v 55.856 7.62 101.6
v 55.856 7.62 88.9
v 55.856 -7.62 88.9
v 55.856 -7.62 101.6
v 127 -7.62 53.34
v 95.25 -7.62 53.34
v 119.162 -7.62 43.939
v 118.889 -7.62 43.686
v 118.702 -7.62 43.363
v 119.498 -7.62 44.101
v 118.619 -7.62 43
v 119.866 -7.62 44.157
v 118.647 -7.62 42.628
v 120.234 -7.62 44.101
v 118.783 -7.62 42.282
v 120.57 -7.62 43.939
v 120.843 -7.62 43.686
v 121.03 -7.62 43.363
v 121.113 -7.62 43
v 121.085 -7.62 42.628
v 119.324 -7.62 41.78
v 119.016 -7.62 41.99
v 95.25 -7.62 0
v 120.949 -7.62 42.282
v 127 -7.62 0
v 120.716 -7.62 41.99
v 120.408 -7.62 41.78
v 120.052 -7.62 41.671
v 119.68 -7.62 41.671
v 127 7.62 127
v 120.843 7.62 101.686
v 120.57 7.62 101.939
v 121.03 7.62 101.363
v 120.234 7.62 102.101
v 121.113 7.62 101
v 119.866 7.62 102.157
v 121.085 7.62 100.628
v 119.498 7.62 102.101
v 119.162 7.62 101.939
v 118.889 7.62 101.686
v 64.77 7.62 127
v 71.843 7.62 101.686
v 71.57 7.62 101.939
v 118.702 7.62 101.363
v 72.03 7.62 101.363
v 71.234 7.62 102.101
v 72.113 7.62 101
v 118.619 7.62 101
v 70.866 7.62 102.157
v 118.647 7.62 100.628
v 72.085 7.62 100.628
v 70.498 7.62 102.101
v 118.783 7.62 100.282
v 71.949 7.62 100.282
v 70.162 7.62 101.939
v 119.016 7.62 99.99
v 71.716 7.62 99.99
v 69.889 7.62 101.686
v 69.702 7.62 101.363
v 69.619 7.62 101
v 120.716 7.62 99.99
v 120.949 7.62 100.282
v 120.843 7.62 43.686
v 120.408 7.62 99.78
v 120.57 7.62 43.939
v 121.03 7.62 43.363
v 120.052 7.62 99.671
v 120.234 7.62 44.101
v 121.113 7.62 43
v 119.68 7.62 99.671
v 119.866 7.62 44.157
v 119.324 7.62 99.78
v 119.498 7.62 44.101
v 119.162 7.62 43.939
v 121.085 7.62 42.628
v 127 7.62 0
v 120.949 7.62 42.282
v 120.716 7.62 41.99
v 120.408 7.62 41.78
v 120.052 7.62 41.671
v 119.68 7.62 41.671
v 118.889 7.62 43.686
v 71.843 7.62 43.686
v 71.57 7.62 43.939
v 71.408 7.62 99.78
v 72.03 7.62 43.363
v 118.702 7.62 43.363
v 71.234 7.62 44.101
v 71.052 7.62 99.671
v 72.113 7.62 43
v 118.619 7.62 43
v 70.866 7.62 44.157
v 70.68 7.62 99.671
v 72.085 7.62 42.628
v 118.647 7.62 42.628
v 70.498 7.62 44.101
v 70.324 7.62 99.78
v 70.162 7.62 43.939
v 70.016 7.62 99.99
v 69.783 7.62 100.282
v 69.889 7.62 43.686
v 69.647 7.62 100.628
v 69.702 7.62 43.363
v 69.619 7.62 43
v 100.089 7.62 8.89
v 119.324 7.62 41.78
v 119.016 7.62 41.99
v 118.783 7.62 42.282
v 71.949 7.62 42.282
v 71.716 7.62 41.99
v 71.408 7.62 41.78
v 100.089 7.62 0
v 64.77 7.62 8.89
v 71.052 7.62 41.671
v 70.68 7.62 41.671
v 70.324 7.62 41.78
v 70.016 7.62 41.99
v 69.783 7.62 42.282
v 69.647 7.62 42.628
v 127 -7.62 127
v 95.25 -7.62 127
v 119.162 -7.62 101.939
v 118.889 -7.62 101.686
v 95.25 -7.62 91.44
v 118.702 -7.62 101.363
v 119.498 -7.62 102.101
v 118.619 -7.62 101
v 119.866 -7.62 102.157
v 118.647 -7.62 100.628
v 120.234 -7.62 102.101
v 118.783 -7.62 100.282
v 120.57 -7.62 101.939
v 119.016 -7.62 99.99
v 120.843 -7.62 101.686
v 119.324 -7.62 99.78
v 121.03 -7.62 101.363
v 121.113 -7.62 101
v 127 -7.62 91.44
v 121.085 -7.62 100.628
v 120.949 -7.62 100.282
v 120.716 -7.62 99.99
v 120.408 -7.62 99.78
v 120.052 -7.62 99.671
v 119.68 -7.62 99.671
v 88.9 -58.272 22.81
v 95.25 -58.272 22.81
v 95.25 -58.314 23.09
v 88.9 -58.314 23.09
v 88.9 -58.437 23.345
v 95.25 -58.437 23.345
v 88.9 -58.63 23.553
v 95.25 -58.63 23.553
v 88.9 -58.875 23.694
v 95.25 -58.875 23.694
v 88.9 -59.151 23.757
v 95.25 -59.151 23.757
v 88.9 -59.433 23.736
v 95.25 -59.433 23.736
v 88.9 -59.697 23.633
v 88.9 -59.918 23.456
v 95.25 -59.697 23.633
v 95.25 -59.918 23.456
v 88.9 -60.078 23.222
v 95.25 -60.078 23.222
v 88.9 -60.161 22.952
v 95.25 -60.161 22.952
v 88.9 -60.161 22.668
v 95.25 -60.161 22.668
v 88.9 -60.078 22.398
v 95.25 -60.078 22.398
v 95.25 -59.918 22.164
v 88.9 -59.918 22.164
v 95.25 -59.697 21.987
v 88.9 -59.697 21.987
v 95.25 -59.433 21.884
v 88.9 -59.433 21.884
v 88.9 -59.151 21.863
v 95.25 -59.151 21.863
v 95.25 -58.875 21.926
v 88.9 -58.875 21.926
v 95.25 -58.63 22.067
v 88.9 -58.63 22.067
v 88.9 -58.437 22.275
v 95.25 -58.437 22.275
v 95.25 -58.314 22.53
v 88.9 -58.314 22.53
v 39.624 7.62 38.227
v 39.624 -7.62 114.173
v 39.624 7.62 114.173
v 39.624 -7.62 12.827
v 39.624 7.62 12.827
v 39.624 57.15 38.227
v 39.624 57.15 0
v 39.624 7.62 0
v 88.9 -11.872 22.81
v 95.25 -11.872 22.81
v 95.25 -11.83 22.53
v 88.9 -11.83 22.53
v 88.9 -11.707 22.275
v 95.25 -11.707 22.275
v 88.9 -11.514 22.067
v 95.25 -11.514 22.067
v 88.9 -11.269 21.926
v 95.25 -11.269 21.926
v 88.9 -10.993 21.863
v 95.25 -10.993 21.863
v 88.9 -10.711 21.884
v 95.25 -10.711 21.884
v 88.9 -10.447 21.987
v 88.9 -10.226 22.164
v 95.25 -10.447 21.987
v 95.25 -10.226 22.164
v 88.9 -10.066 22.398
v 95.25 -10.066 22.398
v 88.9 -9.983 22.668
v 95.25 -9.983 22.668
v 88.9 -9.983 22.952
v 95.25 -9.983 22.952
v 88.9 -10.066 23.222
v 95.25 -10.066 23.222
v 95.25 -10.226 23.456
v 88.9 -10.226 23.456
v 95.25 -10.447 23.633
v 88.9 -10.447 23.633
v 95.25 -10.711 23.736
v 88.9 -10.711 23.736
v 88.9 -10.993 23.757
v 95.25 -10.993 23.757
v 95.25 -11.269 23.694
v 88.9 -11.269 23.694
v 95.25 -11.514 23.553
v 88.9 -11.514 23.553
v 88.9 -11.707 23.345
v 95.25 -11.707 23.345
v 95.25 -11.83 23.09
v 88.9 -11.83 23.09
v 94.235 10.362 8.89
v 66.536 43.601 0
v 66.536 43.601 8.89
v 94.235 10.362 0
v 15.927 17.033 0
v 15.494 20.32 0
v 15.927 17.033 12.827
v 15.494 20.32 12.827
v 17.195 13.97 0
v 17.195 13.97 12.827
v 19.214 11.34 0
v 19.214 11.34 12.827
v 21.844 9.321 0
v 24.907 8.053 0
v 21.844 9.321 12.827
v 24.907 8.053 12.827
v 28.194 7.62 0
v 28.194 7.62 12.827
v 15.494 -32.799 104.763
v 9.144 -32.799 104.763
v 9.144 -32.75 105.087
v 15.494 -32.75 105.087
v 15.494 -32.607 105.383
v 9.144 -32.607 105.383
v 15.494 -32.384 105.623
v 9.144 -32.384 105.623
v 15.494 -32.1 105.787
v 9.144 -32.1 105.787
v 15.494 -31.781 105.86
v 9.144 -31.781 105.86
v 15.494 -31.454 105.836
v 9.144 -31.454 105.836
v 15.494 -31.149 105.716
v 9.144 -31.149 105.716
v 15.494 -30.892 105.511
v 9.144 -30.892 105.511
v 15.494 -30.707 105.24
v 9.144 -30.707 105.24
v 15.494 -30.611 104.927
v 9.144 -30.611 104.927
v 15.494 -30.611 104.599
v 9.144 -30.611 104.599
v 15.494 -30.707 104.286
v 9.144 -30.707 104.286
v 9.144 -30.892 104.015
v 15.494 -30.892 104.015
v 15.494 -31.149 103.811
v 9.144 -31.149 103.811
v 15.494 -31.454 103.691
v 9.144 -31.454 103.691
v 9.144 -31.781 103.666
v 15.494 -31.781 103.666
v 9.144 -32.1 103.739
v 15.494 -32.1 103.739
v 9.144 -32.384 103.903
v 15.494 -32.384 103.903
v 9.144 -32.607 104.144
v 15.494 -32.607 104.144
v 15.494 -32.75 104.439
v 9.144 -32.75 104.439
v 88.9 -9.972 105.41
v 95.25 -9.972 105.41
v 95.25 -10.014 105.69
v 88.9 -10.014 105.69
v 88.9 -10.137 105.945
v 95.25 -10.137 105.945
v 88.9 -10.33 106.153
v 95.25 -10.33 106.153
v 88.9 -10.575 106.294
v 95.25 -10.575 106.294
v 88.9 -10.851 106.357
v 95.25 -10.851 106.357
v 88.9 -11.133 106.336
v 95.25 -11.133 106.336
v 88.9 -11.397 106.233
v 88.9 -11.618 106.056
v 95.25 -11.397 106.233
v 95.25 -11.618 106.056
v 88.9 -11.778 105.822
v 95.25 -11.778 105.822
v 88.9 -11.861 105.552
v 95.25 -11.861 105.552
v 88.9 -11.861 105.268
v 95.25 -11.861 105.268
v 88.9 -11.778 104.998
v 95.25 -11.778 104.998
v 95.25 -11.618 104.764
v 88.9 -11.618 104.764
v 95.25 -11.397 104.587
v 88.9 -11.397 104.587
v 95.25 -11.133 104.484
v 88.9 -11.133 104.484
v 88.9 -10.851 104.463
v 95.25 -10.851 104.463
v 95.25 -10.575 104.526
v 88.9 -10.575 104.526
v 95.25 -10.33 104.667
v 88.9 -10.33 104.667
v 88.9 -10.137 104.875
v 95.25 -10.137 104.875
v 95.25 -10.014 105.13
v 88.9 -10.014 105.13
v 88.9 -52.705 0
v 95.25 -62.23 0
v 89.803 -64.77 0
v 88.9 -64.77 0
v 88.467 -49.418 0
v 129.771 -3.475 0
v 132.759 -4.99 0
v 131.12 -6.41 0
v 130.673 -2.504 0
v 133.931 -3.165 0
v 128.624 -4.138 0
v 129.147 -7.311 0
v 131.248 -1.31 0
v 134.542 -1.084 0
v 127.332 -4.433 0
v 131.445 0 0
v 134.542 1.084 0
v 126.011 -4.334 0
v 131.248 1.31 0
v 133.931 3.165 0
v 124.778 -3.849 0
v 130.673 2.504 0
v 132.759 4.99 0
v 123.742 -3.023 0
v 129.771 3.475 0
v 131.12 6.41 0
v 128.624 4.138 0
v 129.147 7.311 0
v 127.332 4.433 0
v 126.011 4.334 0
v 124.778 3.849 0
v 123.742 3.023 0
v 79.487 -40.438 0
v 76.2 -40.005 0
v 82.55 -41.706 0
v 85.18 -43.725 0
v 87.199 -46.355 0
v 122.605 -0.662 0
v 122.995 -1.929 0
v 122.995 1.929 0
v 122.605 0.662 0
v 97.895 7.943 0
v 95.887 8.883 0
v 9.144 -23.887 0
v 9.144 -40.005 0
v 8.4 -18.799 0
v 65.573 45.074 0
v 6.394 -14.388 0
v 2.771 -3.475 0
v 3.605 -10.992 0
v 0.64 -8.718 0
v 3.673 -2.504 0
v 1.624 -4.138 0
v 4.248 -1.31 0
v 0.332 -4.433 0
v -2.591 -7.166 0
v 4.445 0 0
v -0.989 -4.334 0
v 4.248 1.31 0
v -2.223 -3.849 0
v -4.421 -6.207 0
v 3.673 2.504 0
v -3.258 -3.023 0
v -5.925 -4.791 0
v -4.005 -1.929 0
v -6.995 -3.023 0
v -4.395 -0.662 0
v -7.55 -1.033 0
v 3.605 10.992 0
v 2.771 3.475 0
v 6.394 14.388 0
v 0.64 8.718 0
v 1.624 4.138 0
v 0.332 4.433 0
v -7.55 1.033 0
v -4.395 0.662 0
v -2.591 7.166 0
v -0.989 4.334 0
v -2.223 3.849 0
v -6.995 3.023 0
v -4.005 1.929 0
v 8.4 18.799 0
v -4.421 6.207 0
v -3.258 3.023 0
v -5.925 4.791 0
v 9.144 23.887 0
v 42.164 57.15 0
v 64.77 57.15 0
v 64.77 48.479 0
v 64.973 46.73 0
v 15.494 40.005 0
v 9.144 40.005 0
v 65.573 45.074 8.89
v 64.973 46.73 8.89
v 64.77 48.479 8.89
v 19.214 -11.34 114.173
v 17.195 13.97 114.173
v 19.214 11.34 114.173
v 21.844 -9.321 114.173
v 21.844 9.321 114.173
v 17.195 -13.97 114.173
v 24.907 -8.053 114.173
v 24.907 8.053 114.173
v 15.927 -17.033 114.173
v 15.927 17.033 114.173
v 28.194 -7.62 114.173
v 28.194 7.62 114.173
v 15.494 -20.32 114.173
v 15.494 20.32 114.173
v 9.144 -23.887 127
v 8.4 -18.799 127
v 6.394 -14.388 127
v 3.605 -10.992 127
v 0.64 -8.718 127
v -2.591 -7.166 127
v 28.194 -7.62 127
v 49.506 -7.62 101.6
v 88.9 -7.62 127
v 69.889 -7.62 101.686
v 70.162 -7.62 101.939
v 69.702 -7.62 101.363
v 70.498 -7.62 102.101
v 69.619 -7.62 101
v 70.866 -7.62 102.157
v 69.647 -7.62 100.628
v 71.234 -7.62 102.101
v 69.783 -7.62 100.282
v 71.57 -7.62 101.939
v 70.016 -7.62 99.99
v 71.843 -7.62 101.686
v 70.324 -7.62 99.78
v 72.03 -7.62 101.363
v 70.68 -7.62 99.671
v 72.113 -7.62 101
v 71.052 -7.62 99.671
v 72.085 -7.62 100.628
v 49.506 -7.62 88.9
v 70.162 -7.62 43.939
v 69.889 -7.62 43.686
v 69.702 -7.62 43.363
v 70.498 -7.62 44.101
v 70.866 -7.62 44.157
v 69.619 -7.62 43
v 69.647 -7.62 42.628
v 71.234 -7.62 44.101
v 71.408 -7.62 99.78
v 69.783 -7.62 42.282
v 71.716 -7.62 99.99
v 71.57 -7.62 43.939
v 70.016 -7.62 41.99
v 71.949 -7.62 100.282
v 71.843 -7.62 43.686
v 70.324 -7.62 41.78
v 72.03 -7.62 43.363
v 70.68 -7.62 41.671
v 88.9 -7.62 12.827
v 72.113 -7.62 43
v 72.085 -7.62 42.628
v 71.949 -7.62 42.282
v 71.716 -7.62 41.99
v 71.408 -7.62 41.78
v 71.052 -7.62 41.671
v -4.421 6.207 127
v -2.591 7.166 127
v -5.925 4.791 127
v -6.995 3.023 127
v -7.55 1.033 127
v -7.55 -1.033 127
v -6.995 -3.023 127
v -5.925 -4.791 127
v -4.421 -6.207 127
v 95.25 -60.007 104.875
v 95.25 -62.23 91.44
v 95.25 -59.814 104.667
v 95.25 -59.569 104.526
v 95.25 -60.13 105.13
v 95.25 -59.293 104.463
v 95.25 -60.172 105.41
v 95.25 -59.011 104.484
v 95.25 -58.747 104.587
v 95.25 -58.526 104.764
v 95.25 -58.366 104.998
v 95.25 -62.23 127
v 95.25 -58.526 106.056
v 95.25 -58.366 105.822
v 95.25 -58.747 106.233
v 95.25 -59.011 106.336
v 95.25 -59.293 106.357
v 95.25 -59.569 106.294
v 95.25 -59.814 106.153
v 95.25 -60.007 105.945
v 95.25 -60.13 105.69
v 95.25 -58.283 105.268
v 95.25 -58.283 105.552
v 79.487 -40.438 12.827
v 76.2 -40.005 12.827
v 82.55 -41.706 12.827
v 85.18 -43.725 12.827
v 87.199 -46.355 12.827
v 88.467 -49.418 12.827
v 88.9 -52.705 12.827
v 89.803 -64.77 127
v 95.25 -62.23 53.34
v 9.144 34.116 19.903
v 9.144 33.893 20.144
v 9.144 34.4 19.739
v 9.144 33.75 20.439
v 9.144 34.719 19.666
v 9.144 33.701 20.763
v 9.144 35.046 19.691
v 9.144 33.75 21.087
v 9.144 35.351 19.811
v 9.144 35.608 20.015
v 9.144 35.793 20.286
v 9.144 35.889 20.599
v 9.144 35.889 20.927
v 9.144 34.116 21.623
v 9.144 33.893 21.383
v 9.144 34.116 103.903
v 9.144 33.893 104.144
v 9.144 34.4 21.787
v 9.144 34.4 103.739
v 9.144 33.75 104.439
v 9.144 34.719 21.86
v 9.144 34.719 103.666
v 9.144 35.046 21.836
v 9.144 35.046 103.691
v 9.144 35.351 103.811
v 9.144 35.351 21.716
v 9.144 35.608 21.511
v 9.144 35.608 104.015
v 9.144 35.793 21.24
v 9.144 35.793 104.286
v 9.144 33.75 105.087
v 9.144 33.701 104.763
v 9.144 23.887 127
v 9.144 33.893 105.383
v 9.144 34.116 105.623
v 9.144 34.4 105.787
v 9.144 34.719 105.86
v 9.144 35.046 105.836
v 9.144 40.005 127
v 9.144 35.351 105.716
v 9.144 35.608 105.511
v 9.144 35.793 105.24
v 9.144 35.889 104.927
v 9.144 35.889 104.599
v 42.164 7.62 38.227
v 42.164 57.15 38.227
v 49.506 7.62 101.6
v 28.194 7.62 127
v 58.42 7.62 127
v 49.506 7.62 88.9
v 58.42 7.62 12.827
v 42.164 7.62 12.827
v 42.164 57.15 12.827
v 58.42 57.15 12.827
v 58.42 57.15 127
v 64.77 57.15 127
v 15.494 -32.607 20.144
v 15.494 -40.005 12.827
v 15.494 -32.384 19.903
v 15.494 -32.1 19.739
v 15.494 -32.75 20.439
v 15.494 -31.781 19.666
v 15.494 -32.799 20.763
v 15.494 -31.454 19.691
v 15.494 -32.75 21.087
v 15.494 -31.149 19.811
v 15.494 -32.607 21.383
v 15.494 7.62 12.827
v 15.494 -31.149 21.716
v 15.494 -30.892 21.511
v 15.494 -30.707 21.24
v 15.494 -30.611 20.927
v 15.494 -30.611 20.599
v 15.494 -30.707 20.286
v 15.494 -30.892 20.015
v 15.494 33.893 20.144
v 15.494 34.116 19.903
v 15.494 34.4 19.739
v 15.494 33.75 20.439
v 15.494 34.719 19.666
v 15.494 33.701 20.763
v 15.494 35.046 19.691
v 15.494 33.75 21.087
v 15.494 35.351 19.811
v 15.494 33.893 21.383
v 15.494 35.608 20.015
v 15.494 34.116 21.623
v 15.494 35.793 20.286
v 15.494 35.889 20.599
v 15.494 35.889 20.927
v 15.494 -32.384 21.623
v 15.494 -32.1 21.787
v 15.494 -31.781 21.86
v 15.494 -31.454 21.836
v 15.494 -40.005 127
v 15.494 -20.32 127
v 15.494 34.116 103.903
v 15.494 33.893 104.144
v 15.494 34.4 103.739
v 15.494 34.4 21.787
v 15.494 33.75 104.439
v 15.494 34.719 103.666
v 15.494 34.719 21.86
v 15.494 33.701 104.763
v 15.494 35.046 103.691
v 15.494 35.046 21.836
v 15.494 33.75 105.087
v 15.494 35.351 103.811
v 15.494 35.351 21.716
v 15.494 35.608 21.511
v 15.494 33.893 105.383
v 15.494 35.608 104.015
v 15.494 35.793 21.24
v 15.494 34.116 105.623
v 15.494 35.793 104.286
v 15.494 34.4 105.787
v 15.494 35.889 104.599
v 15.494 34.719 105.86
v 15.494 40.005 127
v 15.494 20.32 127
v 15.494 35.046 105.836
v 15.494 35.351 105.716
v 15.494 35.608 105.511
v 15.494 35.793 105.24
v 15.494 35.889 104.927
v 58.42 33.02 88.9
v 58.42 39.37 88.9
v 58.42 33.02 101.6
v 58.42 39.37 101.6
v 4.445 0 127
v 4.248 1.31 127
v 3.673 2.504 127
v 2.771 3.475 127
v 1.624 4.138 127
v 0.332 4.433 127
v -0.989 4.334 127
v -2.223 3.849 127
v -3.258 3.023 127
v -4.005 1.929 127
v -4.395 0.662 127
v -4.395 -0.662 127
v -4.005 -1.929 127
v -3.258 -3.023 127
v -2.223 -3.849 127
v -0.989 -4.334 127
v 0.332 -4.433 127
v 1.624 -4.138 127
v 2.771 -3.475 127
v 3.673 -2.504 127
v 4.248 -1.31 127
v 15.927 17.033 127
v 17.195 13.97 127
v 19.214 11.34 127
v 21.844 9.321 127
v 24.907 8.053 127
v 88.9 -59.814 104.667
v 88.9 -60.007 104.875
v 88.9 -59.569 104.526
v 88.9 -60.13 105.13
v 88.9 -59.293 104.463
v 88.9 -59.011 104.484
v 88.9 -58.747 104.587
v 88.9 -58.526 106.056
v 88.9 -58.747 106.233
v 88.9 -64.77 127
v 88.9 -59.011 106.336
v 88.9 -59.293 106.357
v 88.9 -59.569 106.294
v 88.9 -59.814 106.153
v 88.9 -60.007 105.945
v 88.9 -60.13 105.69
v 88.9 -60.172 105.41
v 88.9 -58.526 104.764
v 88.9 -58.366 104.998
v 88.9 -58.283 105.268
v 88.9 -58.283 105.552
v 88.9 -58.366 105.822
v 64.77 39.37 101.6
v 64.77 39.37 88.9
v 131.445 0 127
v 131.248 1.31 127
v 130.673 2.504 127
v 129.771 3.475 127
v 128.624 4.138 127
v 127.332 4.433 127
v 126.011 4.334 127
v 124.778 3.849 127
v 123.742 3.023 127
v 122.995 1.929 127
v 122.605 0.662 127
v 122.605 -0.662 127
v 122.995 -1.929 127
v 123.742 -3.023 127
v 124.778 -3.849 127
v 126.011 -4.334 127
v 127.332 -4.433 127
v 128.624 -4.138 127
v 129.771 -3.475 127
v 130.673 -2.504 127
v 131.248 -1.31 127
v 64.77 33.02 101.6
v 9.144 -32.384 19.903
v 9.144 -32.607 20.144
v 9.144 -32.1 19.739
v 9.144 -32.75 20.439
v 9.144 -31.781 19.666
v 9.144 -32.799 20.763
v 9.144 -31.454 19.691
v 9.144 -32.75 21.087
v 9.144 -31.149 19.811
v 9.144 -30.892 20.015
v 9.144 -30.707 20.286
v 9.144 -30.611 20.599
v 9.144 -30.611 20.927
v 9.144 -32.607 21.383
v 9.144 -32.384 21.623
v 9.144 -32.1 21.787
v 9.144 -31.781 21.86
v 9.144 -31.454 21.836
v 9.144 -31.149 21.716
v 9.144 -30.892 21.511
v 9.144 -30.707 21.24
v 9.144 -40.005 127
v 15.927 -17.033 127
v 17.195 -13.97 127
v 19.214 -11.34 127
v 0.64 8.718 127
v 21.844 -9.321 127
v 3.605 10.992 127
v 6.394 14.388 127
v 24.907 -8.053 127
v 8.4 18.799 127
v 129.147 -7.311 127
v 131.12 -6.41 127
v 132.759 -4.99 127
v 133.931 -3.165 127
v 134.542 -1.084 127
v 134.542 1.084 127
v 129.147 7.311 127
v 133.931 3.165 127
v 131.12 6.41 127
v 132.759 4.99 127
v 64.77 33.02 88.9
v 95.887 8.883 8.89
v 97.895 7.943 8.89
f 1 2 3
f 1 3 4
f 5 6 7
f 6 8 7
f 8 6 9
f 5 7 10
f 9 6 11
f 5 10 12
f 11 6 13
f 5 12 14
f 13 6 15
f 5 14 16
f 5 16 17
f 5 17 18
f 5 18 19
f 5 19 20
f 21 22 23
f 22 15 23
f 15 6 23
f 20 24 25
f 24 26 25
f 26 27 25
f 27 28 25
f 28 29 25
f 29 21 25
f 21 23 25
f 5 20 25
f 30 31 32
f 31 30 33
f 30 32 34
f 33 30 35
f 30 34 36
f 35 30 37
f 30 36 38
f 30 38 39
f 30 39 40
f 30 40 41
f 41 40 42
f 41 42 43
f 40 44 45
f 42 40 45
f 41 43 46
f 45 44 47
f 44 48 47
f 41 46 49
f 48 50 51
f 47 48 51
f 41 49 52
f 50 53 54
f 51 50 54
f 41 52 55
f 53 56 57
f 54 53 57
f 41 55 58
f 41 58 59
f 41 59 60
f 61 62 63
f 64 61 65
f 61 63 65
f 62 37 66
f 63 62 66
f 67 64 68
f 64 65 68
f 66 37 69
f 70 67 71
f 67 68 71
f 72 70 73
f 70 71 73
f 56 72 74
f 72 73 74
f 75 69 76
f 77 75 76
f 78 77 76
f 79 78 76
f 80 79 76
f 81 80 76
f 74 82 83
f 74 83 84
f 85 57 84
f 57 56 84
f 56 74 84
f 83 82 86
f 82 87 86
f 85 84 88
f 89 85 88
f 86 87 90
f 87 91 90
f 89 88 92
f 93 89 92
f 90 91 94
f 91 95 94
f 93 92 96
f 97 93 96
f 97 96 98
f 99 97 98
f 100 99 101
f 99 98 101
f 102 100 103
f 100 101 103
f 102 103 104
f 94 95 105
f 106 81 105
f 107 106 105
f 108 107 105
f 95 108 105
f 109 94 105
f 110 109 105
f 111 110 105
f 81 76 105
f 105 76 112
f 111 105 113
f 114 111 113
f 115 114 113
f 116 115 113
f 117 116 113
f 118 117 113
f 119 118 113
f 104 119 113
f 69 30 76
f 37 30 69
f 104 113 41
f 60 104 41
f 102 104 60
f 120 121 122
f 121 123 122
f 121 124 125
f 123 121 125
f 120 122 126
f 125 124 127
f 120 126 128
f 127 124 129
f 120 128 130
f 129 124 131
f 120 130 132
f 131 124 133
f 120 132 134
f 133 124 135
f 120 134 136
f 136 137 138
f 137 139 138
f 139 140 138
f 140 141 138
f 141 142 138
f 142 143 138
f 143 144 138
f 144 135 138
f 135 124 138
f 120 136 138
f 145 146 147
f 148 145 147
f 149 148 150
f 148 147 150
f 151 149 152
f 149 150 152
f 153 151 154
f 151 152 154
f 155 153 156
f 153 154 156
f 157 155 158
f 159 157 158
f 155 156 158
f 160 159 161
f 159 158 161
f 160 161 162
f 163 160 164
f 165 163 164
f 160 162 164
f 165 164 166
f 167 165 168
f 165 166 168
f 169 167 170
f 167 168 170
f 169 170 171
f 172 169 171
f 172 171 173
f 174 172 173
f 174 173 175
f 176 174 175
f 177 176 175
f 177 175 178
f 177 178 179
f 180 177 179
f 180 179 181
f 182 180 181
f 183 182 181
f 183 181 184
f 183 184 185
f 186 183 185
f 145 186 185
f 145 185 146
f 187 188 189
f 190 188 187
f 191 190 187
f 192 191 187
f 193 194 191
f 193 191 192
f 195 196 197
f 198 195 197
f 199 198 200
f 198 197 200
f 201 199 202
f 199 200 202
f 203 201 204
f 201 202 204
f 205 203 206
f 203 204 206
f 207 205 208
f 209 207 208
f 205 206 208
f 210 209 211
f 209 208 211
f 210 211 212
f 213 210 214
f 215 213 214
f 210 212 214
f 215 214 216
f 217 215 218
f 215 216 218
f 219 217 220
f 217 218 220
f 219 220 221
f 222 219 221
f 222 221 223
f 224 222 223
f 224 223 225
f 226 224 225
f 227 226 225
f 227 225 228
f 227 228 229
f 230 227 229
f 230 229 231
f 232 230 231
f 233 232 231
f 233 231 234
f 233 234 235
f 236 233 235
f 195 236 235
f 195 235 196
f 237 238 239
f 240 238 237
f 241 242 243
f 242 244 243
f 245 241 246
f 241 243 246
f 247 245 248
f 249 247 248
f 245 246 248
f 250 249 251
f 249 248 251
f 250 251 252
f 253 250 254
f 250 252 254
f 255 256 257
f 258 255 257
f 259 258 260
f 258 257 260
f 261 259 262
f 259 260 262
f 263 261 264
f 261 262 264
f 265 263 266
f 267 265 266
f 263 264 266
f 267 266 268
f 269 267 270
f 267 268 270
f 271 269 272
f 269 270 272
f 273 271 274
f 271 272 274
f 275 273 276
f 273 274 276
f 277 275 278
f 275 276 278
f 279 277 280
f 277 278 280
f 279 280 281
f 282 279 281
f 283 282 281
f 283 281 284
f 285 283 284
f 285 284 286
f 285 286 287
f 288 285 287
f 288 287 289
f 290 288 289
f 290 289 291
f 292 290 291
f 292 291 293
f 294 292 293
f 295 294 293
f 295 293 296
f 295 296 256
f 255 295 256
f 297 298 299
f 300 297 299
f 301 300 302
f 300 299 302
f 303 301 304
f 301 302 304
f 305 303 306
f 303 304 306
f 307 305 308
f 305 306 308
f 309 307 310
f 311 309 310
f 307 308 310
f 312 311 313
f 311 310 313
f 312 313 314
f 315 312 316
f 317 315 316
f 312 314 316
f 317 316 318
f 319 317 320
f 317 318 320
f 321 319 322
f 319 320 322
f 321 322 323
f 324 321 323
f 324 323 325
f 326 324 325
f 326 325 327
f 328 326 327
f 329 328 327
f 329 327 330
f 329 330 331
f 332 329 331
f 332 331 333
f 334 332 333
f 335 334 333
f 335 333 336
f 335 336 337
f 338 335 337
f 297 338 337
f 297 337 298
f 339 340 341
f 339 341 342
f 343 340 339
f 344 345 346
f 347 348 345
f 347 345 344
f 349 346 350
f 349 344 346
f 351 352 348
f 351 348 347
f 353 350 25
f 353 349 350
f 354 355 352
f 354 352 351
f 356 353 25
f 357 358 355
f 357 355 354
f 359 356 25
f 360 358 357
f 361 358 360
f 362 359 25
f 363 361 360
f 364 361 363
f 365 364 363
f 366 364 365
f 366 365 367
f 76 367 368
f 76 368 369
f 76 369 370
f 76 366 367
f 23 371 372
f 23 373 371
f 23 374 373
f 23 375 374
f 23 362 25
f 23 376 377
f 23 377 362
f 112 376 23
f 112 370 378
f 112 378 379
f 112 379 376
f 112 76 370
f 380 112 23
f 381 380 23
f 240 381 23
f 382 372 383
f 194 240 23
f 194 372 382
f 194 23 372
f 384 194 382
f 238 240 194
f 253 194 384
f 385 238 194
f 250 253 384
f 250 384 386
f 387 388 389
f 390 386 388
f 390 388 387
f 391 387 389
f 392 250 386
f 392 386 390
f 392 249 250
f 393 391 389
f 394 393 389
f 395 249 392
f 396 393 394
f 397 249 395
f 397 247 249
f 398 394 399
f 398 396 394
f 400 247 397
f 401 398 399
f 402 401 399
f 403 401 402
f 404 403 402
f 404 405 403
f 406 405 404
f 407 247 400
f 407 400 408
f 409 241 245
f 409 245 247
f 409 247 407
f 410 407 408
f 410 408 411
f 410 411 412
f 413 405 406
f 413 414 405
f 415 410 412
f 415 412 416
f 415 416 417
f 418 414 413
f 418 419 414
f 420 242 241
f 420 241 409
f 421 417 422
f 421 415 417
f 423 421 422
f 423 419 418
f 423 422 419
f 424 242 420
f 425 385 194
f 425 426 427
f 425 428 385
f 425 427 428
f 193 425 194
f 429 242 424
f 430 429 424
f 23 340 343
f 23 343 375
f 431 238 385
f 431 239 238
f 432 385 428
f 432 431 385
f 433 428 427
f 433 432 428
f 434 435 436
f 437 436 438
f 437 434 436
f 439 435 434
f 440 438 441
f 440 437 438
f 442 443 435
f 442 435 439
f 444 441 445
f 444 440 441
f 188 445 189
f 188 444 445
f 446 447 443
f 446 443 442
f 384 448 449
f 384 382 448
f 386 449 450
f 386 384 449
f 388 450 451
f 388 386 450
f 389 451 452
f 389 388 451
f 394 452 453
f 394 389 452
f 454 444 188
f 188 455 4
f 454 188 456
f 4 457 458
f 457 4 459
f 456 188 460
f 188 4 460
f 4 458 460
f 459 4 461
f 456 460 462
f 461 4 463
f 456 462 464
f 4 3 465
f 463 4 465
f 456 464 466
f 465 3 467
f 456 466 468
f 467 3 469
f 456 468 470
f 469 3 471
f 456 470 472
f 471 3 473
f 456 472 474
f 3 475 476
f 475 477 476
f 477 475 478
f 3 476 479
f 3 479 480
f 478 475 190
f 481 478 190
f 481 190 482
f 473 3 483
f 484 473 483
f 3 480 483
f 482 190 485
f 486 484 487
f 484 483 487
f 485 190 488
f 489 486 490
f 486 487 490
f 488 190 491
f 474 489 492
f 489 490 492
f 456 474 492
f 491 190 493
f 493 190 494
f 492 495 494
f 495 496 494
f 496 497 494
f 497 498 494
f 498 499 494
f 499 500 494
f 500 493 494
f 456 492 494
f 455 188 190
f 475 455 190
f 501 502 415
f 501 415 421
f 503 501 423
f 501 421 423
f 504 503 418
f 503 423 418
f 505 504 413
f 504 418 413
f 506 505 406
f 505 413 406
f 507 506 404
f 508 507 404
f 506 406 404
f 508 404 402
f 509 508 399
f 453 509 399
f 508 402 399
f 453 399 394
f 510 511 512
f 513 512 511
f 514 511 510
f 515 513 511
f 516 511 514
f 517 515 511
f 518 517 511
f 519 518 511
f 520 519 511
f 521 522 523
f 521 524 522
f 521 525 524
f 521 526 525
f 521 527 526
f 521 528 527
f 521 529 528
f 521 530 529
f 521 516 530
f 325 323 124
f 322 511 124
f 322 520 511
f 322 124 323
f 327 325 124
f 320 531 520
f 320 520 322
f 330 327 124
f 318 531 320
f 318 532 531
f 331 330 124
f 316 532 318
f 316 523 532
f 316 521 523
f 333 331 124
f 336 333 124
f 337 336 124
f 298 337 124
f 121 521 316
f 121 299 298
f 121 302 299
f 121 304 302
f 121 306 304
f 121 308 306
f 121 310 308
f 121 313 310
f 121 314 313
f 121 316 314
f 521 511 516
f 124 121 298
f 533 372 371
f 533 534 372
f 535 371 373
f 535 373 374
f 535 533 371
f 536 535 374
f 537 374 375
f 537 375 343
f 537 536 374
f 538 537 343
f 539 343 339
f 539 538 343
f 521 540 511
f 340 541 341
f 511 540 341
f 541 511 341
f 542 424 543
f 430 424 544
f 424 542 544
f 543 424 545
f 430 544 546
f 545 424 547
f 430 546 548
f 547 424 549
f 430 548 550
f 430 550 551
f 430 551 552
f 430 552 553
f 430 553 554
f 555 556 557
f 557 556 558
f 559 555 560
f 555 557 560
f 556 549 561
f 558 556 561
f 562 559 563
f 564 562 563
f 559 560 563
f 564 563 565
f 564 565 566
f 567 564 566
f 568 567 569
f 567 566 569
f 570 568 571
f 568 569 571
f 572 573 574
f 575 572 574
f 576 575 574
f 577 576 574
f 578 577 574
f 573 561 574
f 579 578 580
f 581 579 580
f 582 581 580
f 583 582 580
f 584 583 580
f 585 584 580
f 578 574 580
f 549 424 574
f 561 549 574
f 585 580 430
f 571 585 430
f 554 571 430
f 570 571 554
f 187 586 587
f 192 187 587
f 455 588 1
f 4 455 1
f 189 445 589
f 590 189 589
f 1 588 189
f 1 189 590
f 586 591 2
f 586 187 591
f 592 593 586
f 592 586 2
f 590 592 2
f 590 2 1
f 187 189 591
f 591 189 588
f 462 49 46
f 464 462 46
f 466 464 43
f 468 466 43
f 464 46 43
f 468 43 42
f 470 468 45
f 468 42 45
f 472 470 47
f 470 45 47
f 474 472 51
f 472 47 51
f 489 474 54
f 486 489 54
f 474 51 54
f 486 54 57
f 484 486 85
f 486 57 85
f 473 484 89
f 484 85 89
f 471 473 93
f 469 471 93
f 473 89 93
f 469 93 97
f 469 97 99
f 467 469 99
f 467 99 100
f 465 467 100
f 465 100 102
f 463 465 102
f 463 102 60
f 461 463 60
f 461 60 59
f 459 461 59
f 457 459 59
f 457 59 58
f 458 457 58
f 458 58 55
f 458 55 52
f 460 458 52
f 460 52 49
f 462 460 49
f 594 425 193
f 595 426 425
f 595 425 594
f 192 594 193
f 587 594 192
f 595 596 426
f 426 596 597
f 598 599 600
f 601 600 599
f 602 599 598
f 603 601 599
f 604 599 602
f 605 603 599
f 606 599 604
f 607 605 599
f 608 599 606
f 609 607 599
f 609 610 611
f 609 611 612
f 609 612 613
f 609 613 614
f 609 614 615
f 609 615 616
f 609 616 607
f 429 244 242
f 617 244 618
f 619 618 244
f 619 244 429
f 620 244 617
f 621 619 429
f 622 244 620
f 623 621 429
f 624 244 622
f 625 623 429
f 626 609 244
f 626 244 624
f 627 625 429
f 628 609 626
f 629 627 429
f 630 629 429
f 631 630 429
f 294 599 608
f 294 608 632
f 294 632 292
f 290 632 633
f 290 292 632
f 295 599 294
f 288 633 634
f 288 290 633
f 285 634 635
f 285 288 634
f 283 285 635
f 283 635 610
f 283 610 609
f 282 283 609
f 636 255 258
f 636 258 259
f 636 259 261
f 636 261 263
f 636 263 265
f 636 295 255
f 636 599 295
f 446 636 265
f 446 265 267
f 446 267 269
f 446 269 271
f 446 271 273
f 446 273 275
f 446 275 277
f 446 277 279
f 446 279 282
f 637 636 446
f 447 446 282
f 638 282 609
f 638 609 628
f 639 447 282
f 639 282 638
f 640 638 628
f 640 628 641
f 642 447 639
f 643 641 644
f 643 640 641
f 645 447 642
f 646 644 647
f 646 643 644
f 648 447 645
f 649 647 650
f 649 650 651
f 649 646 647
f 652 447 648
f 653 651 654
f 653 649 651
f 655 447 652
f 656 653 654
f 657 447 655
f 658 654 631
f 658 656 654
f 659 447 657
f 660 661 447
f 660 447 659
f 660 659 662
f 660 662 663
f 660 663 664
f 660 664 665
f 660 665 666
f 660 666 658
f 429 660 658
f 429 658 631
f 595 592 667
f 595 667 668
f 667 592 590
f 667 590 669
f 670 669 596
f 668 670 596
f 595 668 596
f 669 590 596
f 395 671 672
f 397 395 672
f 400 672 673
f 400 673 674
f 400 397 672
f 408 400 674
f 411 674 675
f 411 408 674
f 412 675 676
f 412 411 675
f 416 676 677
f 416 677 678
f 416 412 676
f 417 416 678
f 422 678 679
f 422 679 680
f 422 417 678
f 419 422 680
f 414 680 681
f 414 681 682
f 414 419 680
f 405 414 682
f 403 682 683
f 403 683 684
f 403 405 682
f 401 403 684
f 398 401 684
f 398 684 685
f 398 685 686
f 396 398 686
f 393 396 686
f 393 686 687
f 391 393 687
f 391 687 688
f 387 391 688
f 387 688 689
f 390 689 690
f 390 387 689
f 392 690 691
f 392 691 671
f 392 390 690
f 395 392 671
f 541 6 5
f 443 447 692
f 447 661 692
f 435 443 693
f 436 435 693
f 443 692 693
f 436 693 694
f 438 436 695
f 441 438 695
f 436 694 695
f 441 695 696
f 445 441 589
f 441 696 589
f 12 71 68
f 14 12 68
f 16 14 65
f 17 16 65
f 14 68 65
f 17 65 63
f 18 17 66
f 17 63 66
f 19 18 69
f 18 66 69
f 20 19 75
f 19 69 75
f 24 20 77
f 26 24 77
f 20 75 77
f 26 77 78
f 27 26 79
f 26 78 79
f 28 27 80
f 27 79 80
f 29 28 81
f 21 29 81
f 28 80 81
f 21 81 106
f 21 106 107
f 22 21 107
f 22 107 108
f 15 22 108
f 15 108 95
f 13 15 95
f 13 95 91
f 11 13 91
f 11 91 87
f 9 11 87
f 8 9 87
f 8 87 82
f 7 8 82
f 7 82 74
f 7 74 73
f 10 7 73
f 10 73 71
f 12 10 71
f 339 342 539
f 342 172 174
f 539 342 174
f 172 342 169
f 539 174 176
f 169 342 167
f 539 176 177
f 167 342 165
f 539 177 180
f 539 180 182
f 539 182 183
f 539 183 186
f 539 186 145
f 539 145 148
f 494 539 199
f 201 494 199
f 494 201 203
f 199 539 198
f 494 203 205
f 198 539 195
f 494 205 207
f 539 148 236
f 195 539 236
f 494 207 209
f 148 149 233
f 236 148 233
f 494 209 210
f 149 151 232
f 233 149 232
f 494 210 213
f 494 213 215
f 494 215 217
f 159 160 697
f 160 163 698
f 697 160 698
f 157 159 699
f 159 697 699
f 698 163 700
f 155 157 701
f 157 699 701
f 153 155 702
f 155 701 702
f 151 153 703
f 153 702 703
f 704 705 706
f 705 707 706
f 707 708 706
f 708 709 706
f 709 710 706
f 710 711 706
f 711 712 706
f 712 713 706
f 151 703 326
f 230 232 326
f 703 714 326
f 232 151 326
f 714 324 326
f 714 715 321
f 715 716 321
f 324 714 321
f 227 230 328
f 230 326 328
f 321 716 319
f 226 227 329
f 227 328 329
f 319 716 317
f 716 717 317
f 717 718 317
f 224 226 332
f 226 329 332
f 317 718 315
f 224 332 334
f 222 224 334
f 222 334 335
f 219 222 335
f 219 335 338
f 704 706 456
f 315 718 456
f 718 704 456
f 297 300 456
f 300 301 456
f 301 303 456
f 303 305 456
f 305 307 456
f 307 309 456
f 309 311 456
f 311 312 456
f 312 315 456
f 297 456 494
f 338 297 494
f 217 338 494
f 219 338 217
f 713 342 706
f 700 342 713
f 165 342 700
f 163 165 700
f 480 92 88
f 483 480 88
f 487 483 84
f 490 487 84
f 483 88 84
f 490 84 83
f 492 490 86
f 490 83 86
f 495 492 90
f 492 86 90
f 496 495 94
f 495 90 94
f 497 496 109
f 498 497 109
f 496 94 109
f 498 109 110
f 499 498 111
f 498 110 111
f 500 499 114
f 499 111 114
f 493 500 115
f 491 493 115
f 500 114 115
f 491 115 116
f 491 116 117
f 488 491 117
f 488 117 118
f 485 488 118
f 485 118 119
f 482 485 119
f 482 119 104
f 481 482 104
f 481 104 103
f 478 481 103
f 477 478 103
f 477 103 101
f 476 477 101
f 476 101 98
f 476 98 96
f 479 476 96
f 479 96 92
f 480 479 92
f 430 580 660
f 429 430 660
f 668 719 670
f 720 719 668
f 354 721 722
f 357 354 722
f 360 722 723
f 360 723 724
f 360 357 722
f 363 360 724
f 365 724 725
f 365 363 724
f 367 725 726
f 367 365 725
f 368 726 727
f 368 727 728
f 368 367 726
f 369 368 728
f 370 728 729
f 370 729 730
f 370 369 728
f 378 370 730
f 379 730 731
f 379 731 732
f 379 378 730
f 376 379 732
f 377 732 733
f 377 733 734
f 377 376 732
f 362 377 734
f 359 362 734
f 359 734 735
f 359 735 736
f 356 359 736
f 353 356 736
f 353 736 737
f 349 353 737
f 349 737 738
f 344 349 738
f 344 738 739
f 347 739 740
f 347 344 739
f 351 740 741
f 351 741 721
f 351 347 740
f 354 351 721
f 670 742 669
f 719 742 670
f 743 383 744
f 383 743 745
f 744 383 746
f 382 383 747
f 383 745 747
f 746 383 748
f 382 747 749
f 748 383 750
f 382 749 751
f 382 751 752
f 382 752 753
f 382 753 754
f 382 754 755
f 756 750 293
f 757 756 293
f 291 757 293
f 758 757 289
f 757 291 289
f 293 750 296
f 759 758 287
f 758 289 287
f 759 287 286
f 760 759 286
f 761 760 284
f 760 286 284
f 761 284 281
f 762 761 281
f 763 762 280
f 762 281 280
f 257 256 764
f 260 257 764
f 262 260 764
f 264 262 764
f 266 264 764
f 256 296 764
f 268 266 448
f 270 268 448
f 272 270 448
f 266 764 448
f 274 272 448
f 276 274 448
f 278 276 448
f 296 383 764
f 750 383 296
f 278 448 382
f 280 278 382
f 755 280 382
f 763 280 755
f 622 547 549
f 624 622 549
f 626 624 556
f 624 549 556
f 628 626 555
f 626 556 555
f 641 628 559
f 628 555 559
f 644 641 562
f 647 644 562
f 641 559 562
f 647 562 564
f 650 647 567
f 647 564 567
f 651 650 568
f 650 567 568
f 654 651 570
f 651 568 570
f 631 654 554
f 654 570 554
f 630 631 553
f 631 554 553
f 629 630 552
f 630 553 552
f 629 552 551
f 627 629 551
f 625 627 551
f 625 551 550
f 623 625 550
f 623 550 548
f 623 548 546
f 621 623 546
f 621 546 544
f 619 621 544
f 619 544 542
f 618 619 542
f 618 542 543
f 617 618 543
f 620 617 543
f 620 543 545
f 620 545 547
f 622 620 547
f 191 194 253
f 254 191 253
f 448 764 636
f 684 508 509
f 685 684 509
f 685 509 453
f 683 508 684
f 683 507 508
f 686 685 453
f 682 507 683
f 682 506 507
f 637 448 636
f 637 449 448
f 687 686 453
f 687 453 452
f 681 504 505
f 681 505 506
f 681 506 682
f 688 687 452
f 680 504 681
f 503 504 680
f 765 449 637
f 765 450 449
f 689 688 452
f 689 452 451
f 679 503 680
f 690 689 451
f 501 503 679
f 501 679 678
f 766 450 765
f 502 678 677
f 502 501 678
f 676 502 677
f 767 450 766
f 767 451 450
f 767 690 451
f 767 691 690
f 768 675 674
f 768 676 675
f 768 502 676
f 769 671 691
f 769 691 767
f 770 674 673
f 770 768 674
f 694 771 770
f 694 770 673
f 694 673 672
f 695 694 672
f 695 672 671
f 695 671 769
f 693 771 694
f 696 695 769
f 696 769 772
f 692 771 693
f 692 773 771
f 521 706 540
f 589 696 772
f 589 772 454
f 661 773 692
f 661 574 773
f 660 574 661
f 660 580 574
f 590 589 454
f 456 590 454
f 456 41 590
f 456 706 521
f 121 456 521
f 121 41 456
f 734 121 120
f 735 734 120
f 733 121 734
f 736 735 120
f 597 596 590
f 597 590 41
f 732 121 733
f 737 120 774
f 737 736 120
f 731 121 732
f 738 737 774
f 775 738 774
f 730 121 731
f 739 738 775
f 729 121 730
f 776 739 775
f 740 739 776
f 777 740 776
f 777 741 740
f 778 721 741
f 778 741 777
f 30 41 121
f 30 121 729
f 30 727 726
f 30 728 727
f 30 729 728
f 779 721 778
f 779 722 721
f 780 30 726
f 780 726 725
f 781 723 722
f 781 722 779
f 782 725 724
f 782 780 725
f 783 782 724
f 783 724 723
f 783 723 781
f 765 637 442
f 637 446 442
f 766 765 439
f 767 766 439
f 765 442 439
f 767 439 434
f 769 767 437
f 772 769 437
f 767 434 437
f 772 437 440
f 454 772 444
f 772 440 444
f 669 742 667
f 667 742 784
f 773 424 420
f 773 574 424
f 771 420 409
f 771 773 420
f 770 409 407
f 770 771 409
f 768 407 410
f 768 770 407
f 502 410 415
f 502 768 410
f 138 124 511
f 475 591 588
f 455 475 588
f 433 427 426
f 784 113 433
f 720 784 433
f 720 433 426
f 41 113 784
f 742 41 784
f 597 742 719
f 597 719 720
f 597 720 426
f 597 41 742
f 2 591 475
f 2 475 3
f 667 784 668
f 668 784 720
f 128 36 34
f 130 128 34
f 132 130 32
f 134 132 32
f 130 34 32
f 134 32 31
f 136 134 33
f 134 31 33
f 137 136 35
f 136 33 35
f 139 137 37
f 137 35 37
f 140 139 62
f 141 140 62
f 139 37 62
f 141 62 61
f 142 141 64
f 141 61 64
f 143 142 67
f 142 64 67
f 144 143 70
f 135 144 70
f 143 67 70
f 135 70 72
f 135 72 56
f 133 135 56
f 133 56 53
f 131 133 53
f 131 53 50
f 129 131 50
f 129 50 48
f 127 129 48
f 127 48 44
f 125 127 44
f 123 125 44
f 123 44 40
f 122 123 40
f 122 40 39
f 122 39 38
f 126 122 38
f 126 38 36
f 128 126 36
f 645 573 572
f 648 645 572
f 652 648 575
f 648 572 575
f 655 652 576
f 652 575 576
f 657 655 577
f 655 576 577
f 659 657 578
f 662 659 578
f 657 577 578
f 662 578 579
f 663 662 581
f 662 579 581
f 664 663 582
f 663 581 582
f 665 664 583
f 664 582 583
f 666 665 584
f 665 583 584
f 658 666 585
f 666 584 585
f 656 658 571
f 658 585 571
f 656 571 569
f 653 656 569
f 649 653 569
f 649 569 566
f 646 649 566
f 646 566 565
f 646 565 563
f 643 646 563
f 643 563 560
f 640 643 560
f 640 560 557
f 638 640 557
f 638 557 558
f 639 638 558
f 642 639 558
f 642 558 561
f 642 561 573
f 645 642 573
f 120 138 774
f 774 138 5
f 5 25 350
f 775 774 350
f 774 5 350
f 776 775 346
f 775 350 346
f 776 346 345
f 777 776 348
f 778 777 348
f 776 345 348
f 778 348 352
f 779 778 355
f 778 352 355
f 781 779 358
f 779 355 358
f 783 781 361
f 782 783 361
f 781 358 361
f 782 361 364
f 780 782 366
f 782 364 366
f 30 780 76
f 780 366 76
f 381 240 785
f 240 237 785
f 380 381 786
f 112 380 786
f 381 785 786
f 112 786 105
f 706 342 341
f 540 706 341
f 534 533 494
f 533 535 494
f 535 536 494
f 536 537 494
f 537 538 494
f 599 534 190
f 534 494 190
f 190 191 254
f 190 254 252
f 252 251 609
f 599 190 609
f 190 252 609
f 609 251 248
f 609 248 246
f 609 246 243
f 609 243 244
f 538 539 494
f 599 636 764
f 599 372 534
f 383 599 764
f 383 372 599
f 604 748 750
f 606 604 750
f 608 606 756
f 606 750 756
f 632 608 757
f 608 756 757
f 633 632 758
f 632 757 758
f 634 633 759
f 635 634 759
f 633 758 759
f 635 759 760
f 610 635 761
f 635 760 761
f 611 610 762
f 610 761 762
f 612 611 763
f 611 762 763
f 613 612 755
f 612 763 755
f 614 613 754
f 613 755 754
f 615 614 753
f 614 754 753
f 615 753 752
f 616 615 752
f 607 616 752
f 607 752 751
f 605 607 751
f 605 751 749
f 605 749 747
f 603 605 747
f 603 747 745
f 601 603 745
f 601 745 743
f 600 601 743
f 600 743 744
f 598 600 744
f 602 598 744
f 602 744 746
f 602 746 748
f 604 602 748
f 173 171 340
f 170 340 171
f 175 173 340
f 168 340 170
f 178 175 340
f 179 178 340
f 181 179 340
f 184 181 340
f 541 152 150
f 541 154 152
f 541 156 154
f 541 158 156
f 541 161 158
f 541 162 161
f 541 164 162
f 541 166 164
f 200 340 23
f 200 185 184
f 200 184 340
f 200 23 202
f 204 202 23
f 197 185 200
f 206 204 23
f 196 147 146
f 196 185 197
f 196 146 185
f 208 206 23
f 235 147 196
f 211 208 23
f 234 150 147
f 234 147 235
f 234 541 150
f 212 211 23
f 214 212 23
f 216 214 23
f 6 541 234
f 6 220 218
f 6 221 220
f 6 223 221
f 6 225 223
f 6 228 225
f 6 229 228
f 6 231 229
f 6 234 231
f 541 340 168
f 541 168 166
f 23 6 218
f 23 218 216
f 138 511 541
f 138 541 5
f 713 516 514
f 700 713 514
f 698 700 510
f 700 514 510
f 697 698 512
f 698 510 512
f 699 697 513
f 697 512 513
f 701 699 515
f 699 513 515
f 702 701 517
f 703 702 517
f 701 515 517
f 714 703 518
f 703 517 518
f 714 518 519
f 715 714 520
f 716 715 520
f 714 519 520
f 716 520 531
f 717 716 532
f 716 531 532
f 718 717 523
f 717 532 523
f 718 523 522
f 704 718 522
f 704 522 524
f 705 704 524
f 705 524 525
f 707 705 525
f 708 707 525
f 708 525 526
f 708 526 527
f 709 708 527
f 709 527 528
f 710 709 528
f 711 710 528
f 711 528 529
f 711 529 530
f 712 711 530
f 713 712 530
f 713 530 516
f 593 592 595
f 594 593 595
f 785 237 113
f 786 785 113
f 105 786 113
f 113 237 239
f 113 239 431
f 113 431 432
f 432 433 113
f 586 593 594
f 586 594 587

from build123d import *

# Parameters (mm, degrees)
SKETCH1_R            = 4.445
BOSS_EXTRUDE1_DEPTH  = 127
SKETCH7_W            = 6.35
SKETCH7_H            = 57.15
SKETCH7_H_2          = 80.01
SKETCH7_H_3          = 66.04
BOSS_EXTRUDE4_DEPTH  = 127
CUT_EXTRUDE2_REACH   = 191.917
SKETCH8_R            = 1.0999978
CUT_EXTRUDE4_REACH   = 200.726
SKETCH11_W           = 42.926
SKETCH11_H           = 101.345290086
FILLET1_R            = 17.78
CUT_EXTRUDE6_REACH   = 200.726
SKETCH14_R           = 1.249999967
SKETCH15_W           = 6.35
SKETCH15_H           = 127
CUT_EXTRUDE7_DEPTH   = 7.62
SKETCH16_W           = 12.827354957
SKETCH16_H           = 49.53
BOSS_EXTRUDE5_DEPTH  = 16.256
SKETCH17_W           = 38.227354957
SKETCH17_H           = 49.53
BOSS_EXTRUDE6_DEPTH  = 2.54
SKETCH18_W           = 21.632068301
SKETCH18_H           = 15.24
BOSS_EXTRUDE7_DEPTH  = 101.345290086
FILLET2_R            = 12.7
SKETCH23_R           = 0.95
CUT_EXTRUDE8_DEPTH   = 25.4
CHAMFER1_SIZE        = 2.54
CHAMFER1_SIZE2       = 5.447047578
BOSS_EXTRUDE10_DEPTH = 38.1
SKETCH26_W           = 73.406
SKETCH26_H           = 32.385
BOSS_EXTRUDE11_DEPTH = 12.827354957
FILLET3_R            = 12.7
BOSS_EXTRUDE12_DEPTH = 8.89
FILLET4_R            = 7.62
SKETCH28_W           = 6.35
SKETCH28_H           = 12.7
CUT_EXTRUDE9_DEPTH   = 25.4
SKETCH29_W           = 12.7
SKETCH29_H           = 6.35
CUT_EXTRUDE10_DEPTH  = 25.4


with BuildPart() as part:
    # Sketch1 → Boss-Extrude1 (new body)
    with BuildSketch(Plane.XY):
        with BuildLine():
            Line((0, -7.62), (127, -7.62))
            ThreePointArc((127, -7.62), (134.62, 0), (127, 7.62))
            Line((127, 7.62), (0, 7.62))
            ThreePointArc((0, 7.62), (-7.62, 0), (0, -7.62))
        make_face()
        with Locations((127, 0)):
            Circle(SKETCH1_R, mode=Mode.SUBTRACT)
        Circle(SKETCH1_R, mode=Mode.SUBTRACT)
    extrude(amount=BOSS_EXTRUDE1_DEPTH)

    # Sketch7 → Boss-Extrude4 (add)
    with BuildSketch(Plane.XY.offset(127)):
        with Locations((92.075, -36.195)):
            Rectangle(SKETCH7_W, SKETCH7_H)
        with Locations((12.319, 0)):
            Rectangle(SKETCH7_W, SKETCH7_H_2)
        with Locations((61.595, 31.75)):
            Rectangle(SKETCH7_W, SKETCH7_H_3)
    extrude(amount=-BOSS_EXTRUDE4_DEPTH)

    # Sketch8 → Cut-Extrude2 (cut, up to next)
    with BuildSketch(Plane.ZY.offset(-9.144), mode=Mode.PRIVATE) as cut_extrude2_sk1:
        with Locations(Location((104.763196308, 34.801440473, 0), (0, 0, 270))):
            Circle(SKETCH8_R)
    cut_extrude2_tool1 = extrude(cut_extrude2_sk1.sketch, amount=-CUT_EXTRUDE2_REACH, mode=Mode.PRIVATE) & part.part
    # Sketch8 → Cut-Extrude2 (cut, up to next)
    with BuildSketch(Plane.ZY.offset(-9.144), mode=Mode.PRIVATE) as cut_extrude2_sk2:
        with Locations(Location((104.763196308, -31.698559623, 0), (0, 0, 270))):
            Circle(SKETCH8_R)
    cut_extrude2_tool2 = extrude(cut_extrude2_sk2.sketch, amount=-CUT_EXTRUDE2_REACH, mode=Mode.PRIVATE) & part.part
    # Sketch8 → Cut-Extrude2 (cut, up to next)
    with BuildSketch(Plane.ZY.offset(-9.144), mode=Mode.PRIVATE) as cut_extrude2_sk3:
        with Locations(Location((20.763196414, -31.698559623, 0), (0, 0, 270))):
            Circle(SKETCH8_R)
    cut_extrude2_tool3 = extrude(cut_extrude2_sk3.sketch, amount=-CUT_EXTRUDE2_REACH, mode=Mode.PRIVATE) & part.part
    # Sketch8 → Cut-Extrude2 (cut, up to next)
    with BuildSketch(Plane.ZY.offset(-9.144), mode=Mode.PRIVATE) as cut_extrude2_sk4:
        with Locations(Location((20.763196414, 34.801440473, 0), (0, 0, 270))):
            Circle(SKETCH8_R)
    cut_extrude2_tool4 = extrude(cut_extrude2_sk4.sketch, amount=-CUT_EXTRUDE2_REACH, mode=Mode.PRIVATE) & part.part
    add(cut_extrude2_tool1.solids().sort_by_distance((9.144, 34.80144, 104.763196))[0], mode=Mode.SUBTRACT)
    add(cut_extrude2_tool2.solids().sort_by_distance((9.144, -31.69856, 104.763196))[0], mode=Mode.SUBTRACT)
    add(cut_extrude2_tool3.solids().sort_by_distance((9.144, -31.69856, 20.763196))[0], mode=Mode.SUBTRACT)
    add(cut_extrude2_tool4.solids().sort_by_distance((9.144, 34.80144, 20.763196))[0], mode=Mode.SUBTRACT)

    # Sketch11 → Cut-Extrude4 (cut, up to next)
    with BuildSketch(Plane.XZ.offset(7.62), mode=Mode.PRIVATE) as cut_extrude4_sk1:
        with Locations((36.957, 63.5)):
            Rectangle(SKETCH11_W, SKETCH11_H)
    cut_extrude4_tool1 = extrude(cut_extrude4_sk1.sketch, amount=-CUT_EXTRUDE4_REACH, mode=Mode.PRIVATE) & part.part
    add(cut_extrude4_tool1.solids().sort_by_distance((36.957, -7.62, 63.5))[0], mode=Mode.SUBTRACT)

    # Fillet1
    fillet1_edges = [part.edges().sort_by_distance(p)[0] for p in [
        (9.144, -7.62, 63.5),
        (9.144, 7.62, 63.5),
    ]]
    fillet(fillet1_edges, radius=FILLET1_R)

    # Sketch14 → Cut-Extrude6 (cut, up to next)
    with BuildSketch(Plane(origin=(0, 7.62, 0), x_dir=(1, 0, 0), z_dir=(0, 1, 0)), mode=Mode.PRIVATE) as cut_extrude6_sk1:
        with Locations(Location((119.866000044, -42.90656366, 0), (0, 0, 270))):
            Circle(SKETCH14_R)
    cut_extrude6_tool1 = extrude(cut_extrude6_sk1.sketch, amount=-CUT_EXTRUDE6_REACH, mode=Mode.PRIVATE) & part.part
    # Sketch14 → Cut-Extrude6 (cut, up to next)
    with BuildSketch(Plane(origin=(0, 7.62, 0), x_dir=(1, 0, 0), z_dir=(0, 1, 0)), mode=Mode.PRIVATE) as cut_extrude6_sk2:
        with Locations(Location((70.866, -42.90656366, 0), (0, 0, 270))):
            Circle(SKETCH14_R)
    cut_extrude6_tool2 = extrude(cut_extrude6_sk2.sketch, amount=-CUT_EXTRUDE6_REACH, mode=Mode.PRIVATE) & part.part
    # Sketch14 → Cut-Extrude6 (cut, up to next)
    with BuildSketch(Plane(origin=(0, 7.62, 0), x_dir=(1, 0, 0), z_dir=(0, 1, 0)), mode=Mode.PRIVATE) as cut_extrude6_sk3:
        with Locations(Location((70.866, -100.906563738, 0), (0, 0, 270))):
            Circle(SKETCH14_R)
    cut_extrude6_tool3 = extrude(cut_extrude6_sk3.sketch, amount=-CUT_EXTRUDE6_REACH, mode=Mode.PRIVATE) & part.part
    # Sketch14 → Cut-Extrude6 (cut, up to next)
    with BuildSketch(Plane(origin=(0, 7.62, 0), x_dir=(1, 0, 0), z_dir=(0, 1, 0)), mode=Mode.PRIVATE) as cut_extrude6_sk4:
        with Locations(Location((119.866000044, -100.906563738, 0), (0, 0, 270))):
            Circle(SKETCH14_R)
    cut_extrude6_tool4 = extrude(cut_extrude6_sk4.sketch, amount=-CUT_EXTRUDE6_REACH, mode=Mode.PRIVATE) & part.part
    add(cut_extrude6_tool1.solids().sort_by_distance((119.866, 7.62, 42.906564))[0], mode=Mode.SUBTRACT)
    add(cut_extrude6_tool2.solids().sort_by_distance((70.866, 7.62, 42.906564))[0], mode=Mode.SUBTRACT)
    add(cut_extrude6_tool3.solids().sort_by_distance((70.866, 7.62, 100.906564))[0], mode=Mode.SUBTRACT)
    add(cut_extrude6_tool4.solids().sort_by_distance((119.866, 7.62, 100.906564))[0], mode=Mode.SUBTRACT)

    # Sketch15 → Cut-Extrude7 (cut)
    with BuildSketch(Plane(origin=(0, 64.77, 0), x_dir=(1, 0, 0), z_dir=(0, 1, 0))):
        with Locations((61.595, -63.5)):
            Rectangle(SKETCH15_W, SKETCH15_H)
    extrude(amount=-CUT_EXTRUDE7_DEPTH, mode=Mode.SUBTRACT)

    # Sketch16 → Boss-Extrude5 (add)
    with BuildSketch(Plane.ZY.offset(-58.42)):
        with Locations((6.413677479, 32.385)):
            Rectangle(SKETCH16_W, SKETCH16_H)
    extrude(amount=BOSS_EXTRUDE5_DEPTH)

    # Sketch17 → Boss-Extrude6 (add)
    with BuildSketch(Plane.ZY.offset(-42.164)):
        with Locations((19.113677479, 32.385)):
            Rectangle(SKETCH17_W, SKETCH17_H)
    extrude(amount=BOSS_EXTRUDE6_DEPTH)

    # Sketch18 → Boss-Extrude7 (add)
    with BuildSketch(Plane.XY.offset(12.827354957)):
        with Locations((50.440034151, 0)):
            Rectangle(SKETCH18_W, SKETCH18_H)
    extrude(amount=BOSS_EXTRUDE7_DEPTH)

    # Fillet2
    fillet2_edges = [part.edges().sort_by_distance(p)[0] for p in [
        (15.494, 7.62, 6.413677479),
        (15.494, -7.62, 120.586322521),
        (15.494, 7.62, 120.586322521),
    ]]
    fillet(fillet2_edges, radius=FILLET2_R)

    # Sketch23 → Cut-Extrude8 (cut)
    with BuildSketch(Plane(origin=(95.25, 0, 0), x_dir=(0, 0, -1), z_dir=(1, 0, 0))):
        with Locations(Location((-105.41, -10.922, 0), (0, 0, 90))):
            Circle(SKETCH23_R)
        with Locations(Location((-22.81, -10.922, 0), (0, 0, 270))):
            Circle(SKETCH23_R)
        with Locations(Location((-22.81, -59.222, 0), (0, 0, 90))):
            Circle(SKETCH23_R)
        with Locations(Location((-105.41, -59.222, 0), (0, 0, 270))):
            Circle(SKETCH23_R)
    extrude(amount=-CUT_EXTRUDE8_DEPTH, mode=Mode.SUBTRACT)

    # Chamfer1
    chamfer1_edges = [part.edges().sort_by_distance(p)[0] for p in [
        (95.25, -64.77, 63.5),
    ]]
    chamfer1_side = [part.faces().sort_by_distance(p)[0] for p in [
        (95.25, -36.196757503, 63.499045346),
    ]]
    chamfer(chamfer1_edges, length=CHAMFER1_SIZE, length2=CHAMFER1_SIZE2, reference=chamfer1_side[0])

    # Sketch25 → Boss-Extrude10 (add)
    with BuildSketch(Plane.XY.offset(91.44)):
        Polygon((127, -7.62), (95.25, -7.62), (95.25, -62.23), align=None)
    extrude(amount=-BOSS_EXTRUDE10_DEPTH)

    # Sketch26 → Boss-Extrude11 (add)
    with BuildSketch(Plane(origin=(0, 0, 0), x_dir=(-1, 0, 0), z_dir=(0, 0, -1))):
        with Locations((-52.197, -23.8125)):
            Rectangle(SKETCH26_W, SKETCH26_H)
    extrude(amount=-BOSS_EXTRUDE11_DEPTH)

    # Fillet3
    fillet3_edges = [part.edges().sort_by_distance(p)[0] for p in [
        (88.9, -40.005, 6.413677479),
    ]]
    fillet(fillet3_edges, radius=FILLET3_R)

    # Sketch27 → Boss-Extrude12 (add)
    with BuildSketch(Plane(origin=(0, 0, 0), x_dir=(-1, 0, 0), z_dir=(0, 0, -1))):
        Polygon((-64.77, 7.62), (-64.77, 45.72), (-96.52, 7.62), align=None)
    extrude(amount=-BOSS_EXTRUDE12_DEPTH)

    # Fillet4
    fillet4_edges = [part.edges().sort_by_distance(p)[0] for p in [
        (96.52, 7.62, 4.445),
        (64.77, 45.72, 4.445),
    ]]
    fillet(fillet4_edges, radius=FILLET4_R)

    # Sketch28 → Cut-Extrude9 (cut)
    with BuildSketch(Plane.XZ.offset(7.62)):
        with Locations((52.681214832, 95.25)):
            Rectangle(SKETCH28_W, SKETCH28_H)
    extrude(amount=-CUT_EXTRUDE9_DEPTH, mode=Mode.SUBTRACT)

    # Sketch29 → Cut-Extrude10 (cut)
    with BuildSketch(Plane(origin=(64.77, 0, 0), x_dir=(0, 0, -1), z_dir=(1, 0, 0))):
        with Locations((-95.25, 36.195)):
            Rectangle(SKETCH29_W, SKETCH29_H)
    extrude(amount=-CUT_EXTRUDE10_DEPTH, mode=Mode.SUBTRACT)


solid = part.part
